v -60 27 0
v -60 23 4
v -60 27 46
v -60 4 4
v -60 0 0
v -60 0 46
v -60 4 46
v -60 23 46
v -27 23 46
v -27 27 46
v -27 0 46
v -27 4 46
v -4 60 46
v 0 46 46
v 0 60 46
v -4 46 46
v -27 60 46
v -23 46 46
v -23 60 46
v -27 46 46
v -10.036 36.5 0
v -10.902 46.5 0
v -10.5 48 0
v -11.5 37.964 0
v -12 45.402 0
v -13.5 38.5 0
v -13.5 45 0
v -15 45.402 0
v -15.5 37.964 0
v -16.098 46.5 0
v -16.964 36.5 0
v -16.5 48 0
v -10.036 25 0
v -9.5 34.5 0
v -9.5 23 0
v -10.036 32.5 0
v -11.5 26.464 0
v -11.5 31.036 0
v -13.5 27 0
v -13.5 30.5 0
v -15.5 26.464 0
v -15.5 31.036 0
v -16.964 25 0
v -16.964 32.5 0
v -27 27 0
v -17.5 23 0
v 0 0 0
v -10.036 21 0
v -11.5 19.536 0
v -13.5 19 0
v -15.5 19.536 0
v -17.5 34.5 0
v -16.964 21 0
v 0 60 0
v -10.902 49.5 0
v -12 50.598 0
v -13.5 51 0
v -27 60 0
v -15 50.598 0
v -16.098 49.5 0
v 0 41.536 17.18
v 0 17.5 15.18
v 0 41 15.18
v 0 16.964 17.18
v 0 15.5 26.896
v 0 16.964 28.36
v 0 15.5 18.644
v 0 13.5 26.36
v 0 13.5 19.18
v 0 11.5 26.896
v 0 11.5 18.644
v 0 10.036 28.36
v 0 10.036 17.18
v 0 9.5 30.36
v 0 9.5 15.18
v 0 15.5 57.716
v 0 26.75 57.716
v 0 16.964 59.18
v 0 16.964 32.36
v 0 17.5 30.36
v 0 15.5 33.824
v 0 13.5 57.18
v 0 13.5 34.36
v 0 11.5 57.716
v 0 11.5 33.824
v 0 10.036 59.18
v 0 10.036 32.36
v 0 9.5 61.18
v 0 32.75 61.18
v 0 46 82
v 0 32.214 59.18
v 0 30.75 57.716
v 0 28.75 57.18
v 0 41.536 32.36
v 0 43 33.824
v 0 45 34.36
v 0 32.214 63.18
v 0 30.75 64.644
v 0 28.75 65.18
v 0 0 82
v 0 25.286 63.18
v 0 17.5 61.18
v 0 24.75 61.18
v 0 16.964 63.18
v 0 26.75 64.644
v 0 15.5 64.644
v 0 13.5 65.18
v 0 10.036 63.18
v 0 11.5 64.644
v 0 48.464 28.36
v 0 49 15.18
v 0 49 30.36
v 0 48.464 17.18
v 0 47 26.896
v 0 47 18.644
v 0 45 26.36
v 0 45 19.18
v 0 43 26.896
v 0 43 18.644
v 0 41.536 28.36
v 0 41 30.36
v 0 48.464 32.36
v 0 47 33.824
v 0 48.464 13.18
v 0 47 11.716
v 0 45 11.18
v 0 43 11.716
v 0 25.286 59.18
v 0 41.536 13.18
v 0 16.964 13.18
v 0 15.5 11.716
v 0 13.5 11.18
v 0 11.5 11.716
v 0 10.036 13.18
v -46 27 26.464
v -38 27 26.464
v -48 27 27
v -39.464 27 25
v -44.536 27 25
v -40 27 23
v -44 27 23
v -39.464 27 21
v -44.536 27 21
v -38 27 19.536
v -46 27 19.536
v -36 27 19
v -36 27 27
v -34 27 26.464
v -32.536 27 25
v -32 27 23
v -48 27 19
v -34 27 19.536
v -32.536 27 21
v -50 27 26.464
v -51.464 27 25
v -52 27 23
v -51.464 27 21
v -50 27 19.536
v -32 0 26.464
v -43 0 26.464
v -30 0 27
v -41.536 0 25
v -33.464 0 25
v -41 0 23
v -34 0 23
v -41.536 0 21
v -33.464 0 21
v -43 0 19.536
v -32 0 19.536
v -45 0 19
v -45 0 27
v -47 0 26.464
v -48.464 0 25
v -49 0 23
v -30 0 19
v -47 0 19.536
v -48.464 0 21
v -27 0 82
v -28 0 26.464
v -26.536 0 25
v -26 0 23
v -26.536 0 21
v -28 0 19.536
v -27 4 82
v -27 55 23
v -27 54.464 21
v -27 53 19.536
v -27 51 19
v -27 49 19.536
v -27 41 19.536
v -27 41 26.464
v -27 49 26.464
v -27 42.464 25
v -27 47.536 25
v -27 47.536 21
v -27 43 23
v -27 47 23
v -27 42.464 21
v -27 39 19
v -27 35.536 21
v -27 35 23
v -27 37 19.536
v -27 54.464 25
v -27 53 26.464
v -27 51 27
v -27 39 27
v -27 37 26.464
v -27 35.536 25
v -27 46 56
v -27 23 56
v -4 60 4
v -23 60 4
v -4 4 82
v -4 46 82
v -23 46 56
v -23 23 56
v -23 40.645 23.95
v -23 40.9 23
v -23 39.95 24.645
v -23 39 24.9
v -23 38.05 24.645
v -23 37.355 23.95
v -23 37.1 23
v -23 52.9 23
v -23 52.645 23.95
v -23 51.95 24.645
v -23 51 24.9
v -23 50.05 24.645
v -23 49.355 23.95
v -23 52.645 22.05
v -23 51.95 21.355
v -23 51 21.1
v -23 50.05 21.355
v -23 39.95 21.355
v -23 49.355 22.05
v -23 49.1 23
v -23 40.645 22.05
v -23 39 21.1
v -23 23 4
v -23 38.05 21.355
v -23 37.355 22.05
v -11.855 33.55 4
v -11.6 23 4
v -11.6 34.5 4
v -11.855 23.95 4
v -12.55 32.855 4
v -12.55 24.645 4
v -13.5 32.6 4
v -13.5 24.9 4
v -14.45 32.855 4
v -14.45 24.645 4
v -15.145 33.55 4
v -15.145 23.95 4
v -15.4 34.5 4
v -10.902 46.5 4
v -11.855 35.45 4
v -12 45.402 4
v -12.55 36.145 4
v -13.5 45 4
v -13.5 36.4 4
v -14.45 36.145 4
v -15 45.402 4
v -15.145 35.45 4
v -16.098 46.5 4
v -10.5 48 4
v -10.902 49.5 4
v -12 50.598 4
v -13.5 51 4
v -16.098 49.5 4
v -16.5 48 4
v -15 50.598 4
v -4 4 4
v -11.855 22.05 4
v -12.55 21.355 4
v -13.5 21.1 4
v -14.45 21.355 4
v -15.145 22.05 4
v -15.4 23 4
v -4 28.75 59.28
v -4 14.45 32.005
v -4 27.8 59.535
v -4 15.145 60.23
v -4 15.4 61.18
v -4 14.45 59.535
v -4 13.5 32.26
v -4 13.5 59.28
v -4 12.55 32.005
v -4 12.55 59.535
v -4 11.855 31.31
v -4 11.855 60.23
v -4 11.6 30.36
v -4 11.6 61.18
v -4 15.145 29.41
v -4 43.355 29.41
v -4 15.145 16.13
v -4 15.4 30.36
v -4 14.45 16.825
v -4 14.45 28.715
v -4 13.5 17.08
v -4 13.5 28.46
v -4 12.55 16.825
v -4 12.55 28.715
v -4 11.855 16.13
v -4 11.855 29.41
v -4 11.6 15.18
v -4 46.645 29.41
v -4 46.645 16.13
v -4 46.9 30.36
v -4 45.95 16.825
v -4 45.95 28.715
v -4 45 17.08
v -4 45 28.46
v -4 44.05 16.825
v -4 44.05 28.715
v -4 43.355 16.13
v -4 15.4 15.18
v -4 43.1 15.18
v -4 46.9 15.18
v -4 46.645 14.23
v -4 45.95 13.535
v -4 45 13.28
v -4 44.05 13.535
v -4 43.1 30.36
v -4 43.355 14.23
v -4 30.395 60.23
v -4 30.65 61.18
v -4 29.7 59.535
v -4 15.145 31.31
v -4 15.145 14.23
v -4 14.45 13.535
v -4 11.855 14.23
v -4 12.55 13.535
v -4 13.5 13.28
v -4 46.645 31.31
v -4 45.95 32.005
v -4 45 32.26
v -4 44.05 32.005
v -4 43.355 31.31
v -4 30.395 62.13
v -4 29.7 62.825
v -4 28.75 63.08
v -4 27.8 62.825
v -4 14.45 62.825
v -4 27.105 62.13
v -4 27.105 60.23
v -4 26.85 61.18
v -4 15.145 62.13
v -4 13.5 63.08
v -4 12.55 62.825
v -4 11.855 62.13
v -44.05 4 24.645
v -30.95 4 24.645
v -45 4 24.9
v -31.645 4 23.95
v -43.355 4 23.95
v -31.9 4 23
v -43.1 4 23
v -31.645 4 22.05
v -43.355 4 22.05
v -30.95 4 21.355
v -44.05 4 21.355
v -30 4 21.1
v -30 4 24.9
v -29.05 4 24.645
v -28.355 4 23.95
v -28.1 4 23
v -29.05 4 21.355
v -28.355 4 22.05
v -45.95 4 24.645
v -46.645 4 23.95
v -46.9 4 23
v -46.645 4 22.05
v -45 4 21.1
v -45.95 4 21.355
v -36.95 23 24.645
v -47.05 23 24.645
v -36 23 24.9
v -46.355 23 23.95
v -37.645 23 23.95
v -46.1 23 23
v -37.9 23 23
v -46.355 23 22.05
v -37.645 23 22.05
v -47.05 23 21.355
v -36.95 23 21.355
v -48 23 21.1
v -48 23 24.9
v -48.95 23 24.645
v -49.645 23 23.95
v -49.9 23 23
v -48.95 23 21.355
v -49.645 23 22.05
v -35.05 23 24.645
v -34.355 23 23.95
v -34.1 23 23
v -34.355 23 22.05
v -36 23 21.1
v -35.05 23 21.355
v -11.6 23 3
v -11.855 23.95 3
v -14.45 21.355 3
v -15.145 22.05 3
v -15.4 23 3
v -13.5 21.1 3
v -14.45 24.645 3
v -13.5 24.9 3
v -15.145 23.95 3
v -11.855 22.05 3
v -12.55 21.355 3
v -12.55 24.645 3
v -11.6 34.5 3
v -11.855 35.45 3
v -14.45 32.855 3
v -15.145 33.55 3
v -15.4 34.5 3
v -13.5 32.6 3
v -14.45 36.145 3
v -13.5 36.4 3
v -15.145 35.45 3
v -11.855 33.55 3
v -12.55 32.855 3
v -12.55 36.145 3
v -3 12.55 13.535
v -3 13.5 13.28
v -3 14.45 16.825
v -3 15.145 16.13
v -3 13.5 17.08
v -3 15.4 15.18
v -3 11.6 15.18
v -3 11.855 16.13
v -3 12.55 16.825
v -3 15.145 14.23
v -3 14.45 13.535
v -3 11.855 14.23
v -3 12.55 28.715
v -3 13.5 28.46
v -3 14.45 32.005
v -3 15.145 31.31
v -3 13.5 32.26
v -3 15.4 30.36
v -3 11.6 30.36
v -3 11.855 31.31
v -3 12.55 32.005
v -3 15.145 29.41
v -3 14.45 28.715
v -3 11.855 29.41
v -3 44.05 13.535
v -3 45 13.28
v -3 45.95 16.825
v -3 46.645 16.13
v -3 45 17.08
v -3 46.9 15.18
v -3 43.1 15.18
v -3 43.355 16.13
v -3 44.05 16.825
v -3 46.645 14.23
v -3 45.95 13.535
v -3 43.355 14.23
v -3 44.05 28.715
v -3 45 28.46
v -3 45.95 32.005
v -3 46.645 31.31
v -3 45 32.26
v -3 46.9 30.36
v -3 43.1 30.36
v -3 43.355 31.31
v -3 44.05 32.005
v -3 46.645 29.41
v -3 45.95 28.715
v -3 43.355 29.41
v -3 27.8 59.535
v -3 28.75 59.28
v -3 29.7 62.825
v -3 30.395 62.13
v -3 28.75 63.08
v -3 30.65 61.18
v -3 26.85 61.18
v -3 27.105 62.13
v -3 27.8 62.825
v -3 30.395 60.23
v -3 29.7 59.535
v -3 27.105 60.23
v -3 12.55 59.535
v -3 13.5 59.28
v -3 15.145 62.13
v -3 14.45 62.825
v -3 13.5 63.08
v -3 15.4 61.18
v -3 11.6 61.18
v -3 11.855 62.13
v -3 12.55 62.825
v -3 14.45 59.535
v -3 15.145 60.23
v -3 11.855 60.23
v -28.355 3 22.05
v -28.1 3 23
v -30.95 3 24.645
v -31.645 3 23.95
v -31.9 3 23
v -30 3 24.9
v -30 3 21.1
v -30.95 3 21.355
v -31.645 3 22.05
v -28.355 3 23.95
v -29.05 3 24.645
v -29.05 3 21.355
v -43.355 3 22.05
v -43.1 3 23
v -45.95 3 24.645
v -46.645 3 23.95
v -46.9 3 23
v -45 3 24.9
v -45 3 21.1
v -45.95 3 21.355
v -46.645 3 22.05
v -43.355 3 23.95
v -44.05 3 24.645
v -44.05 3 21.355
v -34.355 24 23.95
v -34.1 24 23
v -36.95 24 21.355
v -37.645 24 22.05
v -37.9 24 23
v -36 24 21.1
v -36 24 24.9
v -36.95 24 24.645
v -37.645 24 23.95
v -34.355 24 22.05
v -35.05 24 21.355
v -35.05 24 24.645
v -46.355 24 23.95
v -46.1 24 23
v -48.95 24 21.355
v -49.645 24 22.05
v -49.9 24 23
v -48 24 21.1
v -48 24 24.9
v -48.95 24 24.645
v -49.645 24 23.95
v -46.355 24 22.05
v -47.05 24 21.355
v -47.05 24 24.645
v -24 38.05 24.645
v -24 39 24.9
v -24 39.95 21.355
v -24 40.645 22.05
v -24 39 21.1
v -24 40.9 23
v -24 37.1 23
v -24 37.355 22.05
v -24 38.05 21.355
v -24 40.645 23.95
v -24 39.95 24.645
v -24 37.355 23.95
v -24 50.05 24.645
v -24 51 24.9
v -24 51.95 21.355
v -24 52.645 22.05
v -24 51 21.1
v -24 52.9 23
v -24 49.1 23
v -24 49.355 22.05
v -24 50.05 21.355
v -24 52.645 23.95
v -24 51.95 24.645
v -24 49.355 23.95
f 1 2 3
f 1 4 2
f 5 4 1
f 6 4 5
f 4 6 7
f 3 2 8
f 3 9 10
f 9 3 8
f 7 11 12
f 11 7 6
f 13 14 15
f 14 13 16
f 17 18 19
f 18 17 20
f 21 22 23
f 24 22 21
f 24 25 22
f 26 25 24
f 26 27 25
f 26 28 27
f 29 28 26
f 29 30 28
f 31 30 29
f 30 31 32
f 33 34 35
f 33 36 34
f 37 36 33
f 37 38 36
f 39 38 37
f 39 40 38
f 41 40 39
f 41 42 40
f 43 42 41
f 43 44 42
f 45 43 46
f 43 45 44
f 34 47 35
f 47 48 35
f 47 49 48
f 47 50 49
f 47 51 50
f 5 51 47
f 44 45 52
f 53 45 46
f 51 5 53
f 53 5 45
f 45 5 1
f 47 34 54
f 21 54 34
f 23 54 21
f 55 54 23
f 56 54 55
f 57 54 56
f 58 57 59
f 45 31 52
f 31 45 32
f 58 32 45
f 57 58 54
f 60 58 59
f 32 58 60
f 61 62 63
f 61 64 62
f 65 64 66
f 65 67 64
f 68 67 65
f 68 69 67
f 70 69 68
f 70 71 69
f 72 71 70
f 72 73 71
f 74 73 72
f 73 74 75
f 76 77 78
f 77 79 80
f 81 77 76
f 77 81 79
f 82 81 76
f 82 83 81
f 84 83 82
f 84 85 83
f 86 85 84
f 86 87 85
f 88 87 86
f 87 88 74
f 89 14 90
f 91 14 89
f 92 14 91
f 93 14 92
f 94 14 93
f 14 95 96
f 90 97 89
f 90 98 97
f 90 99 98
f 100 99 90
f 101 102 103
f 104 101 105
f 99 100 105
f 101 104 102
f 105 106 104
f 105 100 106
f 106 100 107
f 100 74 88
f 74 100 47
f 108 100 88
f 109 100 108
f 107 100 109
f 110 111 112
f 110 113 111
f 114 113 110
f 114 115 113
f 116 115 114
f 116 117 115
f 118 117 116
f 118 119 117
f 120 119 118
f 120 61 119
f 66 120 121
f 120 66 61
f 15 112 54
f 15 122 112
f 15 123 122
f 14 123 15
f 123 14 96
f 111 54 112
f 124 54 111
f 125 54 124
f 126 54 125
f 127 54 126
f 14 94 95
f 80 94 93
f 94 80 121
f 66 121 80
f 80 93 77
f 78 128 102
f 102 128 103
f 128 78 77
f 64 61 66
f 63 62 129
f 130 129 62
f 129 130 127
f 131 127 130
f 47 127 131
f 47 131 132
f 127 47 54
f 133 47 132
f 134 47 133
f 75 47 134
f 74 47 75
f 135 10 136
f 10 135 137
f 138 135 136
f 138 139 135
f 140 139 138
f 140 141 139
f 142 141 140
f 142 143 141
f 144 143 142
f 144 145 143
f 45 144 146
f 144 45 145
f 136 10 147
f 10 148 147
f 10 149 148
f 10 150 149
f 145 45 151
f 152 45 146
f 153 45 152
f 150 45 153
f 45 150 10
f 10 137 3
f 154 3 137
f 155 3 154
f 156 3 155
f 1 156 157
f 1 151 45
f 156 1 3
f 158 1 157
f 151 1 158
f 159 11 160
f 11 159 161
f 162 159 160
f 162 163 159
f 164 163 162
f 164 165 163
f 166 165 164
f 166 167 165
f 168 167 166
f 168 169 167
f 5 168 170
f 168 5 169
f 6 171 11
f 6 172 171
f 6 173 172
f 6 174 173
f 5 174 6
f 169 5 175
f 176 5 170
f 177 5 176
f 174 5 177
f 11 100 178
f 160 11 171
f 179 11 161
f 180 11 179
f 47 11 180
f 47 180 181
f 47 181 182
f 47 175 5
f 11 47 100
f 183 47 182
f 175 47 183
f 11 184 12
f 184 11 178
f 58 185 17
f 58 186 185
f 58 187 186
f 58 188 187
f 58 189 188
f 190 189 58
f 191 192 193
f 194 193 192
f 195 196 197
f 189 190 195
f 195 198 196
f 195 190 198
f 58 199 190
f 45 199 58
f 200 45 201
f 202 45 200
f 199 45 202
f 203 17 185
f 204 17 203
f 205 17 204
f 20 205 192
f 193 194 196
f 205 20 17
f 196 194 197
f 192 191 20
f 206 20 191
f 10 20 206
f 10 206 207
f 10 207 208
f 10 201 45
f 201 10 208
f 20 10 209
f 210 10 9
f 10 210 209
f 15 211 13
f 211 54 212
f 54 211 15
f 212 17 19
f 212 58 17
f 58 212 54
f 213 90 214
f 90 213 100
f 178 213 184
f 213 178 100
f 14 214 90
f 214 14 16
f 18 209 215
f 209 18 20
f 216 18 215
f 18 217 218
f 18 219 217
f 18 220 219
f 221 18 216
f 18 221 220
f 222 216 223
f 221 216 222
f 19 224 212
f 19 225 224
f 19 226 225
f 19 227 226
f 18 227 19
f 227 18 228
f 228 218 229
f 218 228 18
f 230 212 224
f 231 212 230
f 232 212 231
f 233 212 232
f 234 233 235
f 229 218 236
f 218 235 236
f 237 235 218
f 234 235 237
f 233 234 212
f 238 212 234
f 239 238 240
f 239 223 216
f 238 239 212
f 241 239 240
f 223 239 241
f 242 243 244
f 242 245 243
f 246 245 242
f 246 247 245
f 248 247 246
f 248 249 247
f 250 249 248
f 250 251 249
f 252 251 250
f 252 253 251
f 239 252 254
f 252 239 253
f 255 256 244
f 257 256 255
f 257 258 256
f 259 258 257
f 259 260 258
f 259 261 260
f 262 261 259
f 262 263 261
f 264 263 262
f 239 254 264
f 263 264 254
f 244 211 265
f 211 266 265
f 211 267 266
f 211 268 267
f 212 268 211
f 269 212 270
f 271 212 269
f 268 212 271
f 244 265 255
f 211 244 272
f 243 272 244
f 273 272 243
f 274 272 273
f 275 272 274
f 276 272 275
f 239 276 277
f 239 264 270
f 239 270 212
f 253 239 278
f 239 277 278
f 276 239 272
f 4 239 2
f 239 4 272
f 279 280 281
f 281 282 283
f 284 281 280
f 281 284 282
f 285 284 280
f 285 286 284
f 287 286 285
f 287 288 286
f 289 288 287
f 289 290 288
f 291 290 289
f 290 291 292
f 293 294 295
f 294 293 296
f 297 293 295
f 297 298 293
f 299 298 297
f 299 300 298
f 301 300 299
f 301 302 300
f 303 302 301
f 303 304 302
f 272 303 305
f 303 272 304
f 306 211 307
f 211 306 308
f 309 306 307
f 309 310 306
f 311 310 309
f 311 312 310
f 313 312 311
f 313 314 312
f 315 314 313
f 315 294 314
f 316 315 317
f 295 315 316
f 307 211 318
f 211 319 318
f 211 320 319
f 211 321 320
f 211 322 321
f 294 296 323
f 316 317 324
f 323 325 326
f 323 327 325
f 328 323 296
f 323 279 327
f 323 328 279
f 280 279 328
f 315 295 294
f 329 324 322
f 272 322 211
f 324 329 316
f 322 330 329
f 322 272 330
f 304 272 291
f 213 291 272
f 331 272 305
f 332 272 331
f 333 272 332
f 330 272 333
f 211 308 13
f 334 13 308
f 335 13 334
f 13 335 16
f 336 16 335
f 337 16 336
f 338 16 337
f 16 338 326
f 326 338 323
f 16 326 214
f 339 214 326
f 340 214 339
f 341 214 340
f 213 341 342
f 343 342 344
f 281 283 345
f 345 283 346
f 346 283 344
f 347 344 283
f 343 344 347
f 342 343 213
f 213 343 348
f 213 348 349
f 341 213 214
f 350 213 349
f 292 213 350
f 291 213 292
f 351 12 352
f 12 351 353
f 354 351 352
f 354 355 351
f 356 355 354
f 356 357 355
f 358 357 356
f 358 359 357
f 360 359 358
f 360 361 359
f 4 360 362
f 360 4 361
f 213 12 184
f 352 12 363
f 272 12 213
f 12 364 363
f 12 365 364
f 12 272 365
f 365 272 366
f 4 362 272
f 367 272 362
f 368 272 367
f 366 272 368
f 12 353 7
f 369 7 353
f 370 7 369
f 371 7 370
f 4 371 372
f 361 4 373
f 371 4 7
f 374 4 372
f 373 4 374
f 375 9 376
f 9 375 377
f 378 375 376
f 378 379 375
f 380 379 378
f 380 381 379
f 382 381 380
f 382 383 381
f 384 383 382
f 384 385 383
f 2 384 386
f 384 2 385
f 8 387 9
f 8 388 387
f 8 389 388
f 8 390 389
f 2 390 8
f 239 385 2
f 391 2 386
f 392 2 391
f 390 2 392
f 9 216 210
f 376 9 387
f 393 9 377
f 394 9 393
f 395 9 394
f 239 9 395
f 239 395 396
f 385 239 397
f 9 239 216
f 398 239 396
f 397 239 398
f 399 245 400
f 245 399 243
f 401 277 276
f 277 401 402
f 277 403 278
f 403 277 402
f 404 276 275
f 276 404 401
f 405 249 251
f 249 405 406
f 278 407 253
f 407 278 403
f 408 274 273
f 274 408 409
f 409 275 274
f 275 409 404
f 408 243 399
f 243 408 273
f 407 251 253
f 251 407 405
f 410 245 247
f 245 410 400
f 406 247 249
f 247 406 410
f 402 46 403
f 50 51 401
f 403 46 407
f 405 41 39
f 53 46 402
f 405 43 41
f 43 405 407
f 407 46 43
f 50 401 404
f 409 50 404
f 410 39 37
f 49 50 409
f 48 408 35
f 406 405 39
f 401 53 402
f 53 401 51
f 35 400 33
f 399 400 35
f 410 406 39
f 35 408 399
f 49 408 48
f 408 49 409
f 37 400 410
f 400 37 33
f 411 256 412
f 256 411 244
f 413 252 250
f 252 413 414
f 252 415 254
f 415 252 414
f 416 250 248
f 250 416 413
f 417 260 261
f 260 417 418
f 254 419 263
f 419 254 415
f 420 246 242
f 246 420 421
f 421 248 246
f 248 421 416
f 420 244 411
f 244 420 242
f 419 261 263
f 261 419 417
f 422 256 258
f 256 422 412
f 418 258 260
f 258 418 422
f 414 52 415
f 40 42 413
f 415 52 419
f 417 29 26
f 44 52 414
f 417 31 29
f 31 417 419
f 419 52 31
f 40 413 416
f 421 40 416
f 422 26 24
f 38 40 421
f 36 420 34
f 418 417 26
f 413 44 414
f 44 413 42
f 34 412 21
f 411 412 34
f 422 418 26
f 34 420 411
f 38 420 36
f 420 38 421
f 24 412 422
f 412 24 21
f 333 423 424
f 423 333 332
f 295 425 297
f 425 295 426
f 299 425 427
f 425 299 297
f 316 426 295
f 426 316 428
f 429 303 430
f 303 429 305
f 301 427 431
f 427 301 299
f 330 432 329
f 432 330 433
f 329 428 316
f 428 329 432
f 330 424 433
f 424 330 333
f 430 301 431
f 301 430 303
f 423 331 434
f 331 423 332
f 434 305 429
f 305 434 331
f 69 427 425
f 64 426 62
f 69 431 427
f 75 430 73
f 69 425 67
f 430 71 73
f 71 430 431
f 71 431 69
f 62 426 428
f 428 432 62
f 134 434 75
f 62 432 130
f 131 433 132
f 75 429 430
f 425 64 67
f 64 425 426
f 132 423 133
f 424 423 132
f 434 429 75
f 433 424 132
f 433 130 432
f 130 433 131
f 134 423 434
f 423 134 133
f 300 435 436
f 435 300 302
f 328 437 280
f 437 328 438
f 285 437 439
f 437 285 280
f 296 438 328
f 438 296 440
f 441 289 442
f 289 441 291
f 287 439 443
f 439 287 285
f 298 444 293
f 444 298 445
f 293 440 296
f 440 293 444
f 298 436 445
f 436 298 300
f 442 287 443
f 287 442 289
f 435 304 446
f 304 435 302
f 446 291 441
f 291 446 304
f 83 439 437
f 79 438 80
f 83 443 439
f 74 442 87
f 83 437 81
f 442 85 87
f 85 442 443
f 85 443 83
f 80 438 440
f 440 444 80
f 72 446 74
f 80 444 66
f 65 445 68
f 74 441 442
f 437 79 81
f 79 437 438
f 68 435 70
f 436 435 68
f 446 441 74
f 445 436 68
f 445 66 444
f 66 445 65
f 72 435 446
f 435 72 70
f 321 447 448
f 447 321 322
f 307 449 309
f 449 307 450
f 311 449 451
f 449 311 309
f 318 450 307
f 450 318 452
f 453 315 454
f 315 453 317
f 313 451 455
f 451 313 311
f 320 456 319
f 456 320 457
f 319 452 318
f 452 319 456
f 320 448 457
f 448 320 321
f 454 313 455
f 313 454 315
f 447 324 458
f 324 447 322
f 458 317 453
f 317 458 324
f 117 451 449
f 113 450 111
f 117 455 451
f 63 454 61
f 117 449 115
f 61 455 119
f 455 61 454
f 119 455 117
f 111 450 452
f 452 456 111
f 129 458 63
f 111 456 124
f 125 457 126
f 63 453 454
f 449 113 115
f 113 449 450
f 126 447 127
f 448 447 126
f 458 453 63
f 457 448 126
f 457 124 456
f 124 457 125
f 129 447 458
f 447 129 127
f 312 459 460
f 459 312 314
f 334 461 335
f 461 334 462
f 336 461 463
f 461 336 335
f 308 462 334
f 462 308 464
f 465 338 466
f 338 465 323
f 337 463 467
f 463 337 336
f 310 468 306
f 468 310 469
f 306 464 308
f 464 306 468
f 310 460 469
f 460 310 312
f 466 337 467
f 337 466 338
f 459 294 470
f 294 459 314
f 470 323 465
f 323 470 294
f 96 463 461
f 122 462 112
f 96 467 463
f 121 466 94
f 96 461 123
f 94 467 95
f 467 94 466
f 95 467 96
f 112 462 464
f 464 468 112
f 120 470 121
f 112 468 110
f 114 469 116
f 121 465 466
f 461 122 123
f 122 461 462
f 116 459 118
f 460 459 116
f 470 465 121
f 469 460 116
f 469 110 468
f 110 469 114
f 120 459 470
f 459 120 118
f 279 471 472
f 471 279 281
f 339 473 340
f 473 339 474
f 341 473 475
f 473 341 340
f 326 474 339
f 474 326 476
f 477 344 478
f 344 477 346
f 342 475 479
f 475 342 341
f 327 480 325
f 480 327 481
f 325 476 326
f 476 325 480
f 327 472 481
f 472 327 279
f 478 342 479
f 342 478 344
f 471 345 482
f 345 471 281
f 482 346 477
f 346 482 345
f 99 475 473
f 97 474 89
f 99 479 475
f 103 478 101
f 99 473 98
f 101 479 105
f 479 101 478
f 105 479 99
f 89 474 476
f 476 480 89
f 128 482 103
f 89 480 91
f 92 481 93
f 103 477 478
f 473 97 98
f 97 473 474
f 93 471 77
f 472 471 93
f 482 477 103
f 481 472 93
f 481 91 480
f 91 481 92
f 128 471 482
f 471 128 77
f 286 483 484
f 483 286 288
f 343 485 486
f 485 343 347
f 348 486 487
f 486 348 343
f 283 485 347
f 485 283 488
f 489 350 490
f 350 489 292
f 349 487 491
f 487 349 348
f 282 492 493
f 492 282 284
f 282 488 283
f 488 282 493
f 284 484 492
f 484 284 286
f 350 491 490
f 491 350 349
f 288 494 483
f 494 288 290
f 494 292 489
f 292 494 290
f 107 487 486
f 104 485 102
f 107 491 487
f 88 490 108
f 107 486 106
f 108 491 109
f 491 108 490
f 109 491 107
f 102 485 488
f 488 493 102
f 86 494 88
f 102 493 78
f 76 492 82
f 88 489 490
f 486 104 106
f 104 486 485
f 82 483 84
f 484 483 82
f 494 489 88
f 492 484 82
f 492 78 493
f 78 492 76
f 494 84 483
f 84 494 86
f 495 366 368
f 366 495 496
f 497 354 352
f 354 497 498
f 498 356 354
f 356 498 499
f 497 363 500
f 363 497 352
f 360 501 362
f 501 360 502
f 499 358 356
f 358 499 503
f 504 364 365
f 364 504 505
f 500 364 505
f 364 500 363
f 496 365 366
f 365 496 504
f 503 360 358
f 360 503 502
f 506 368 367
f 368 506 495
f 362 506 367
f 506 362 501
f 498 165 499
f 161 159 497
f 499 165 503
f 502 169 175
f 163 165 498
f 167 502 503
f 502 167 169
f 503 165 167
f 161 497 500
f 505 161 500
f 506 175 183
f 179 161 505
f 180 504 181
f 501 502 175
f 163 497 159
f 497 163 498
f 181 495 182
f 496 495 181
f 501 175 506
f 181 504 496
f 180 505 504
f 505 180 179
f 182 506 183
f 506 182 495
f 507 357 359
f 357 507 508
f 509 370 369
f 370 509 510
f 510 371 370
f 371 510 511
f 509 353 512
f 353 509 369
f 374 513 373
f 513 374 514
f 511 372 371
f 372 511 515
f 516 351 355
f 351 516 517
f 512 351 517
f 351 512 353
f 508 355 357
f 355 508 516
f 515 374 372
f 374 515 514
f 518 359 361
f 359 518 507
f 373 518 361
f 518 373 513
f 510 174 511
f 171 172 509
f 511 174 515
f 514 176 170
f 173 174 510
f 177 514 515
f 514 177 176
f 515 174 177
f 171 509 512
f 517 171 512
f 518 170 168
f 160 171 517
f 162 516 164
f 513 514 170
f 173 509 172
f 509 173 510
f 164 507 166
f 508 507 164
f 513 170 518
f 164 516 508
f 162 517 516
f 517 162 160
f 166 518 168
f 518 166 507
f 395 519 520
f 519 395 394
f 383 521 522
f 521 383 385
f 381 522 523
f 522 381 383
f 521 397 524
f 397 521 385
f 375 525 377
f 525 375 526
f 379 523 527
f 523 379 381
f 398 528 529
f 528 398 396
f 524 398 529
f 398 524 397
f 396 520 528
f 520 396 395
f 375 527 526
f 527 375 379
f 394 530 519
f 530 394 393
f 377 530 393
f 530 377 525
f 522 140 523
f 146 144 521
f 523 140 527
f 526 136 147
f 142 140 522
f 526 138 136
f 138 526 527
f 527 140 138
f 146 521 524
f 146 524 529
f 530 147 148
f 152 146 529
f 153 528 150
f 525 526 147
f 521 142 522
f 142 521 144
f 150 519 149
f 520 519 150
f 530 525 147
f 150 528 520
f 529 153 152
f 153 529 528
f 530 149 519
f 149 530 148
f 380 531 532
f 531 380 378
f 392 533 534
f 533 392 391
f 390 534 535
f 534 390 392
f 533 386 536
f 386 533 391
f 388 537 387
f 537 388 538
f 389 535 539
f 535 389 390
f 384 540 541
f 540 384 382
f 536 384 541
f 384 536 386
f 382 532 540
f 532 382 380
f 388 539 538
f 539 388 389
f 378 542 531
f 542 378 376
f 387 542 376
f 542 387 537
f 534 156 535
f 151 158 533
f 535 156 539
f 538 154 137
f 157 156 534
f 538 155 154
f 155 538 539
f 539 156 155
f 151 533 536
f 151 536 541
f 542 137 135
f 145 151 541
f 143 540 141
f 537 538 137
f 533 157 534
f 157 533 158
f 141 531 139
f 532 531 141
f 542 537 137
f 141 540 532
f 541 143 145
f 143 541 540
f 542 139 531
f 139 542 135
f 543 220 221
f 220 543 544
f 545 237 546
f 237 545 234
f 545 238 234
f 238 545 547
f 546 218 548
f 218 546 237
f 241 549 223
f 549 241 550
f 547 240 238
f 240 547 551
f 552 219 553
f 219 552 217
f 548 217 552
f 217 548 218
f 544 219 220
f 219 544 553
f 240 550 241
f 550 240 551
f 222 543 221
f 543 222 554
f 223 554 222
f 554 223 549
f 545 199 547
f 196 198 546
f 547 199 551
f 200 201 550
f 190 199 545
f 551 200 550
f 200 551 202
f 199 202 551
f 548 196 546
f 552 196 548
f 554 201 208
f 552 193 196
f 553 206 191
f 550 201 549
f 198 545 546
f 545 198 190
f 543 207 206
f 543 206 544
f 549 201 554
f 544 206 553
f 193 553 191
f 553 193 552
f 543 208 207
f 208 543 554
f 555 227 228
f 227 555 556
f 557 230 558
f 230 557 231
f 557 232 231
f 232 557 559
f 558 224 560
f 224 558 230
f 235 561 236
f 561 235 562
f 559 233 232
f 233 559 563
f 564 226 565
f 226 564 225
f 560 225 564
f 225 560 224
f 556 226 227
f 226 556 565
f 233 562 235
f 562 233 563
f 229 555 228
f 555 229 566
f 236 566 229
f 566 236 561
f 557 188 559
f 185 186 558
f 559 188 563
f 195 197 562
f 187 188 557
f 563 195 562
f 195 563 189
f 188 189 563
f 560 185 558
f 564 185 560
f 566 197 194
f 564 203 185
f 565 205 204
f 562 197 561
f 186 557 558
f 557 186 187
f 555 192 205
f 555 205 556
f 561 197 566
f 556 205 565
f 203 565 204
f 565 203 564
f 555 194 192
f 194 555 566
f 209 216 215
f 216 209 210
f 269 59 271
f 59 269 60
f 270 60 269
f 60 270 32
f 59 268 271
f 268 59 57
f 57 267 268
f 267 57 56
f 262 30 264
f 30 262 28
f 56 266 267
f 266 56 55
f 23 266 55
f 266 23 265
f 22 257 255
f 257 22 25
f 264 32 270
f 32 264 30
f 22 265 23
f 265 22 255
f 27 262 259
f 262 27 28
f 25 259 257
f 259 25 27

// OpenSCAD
difference(){
	scale(v = [-1, 1, 1]) {
		union() {
			cube(size = [60, 27, 46]);
			cube(size = [27, 60, 46]);
			translate(v = [0, 0, 42]) {
				cube(size = [27, 46, 40]);
			}
			translate(v = [13.5000000000, 23.0000000000, 0]) {
				rotate(a = 180, v = [1, 0, 0]) {
				}
			}
			translate(v = [13.5000000000, 34.5000000000, 0]) {
				rotate(a = 180, v = [1, 0, 0]) {
				}
			}
			translate(v = [0, 13.5000000000, 15.1800000000]) {
				rotate(a = -90, v = [0, 1, 0]) {
				}
			}
			translate(v = [0, 13.5000000000, 30.3600000000]) {
				rotate(a = -90, v = [0, 1, 0]) {
				}
			}
			translate(v = [0, 45.0000000000, 15.1800000000]) {
				rotate(a = -90, v = [0, 1, 0]) {
				}
			}
			translate(v = [0, 45.0000000000, 30.3600000000]) {
				rotate(a = -90, v = [0, 1, 0]) {
				}
			}
			translate(v = [0, 28.7500000000, 61.1800000000]) {
				rotate(a = -90, v = [0, 1, 0]) {
				}
			}
			translate(v = [0, 13.5000000000, 61.1800000000]) {
				rotate(a = -90, v = [0, 1, 0]) {
				}
			}
			translate(v = [30.0000000000, 0, 23.0000000000]) {
				rotate(a = 90, v = [1, 0, 0]) {
				}
			}
			translate(v = [45.0000000000, 0, 23.0000000000]) {
				rotate(a = 90, v = [1, 0, 0]) {
				}
			}
			translate(v = [36.0000000000, 27, 23.0000000000]) {
				rotate(a = -90, v = [1, 0, 0]) {
				}
			}
			translate(v = [48.0000000000, 27, 23.0000000000]) {
				rotate(a = -90, v = [1, 0, 0]) {
				}
			}
			translate(v = [27, 39.0000000000, 23.0000000000]) {
				rotate(a = 90, v = [0, 1, 0]) {
				}
			}
			translate(v = [27, 51.0000000000, 23.0000000000]) {
				rotate(a = 90, v = [0, 1, 0]) {
				}
			}
			translate(v = [13.5000000000, 48.0000000000, -1]) {
			}
		}
	}
	/* Holes Below*/
	scale(v = [-1, 1, 1]){
		union(){
			translate(v = [4, 4, 4]) {
				cube(size = [19, 60, 100]);
				cube(size = [60, 19, 100]);
			}
			translate(v = [4, 4, 56]) {
				cube(size = [50, 50, 50]);
			}
			translate(v = [13.5000000000, 23.0000000000, 0]){
				rotate(a = 180, v = [1, 0, 0]){
					union() {
						union() {
							translate(v = [0, 0, -5]) {
								cylinder($fn = 12, h = 5, r = 1.9000000000);
							}
							translate(v = [0, 0, -3]) {
								cylinder($fn = 12, h = 3, r1 = 1.9000000000, r2 = 4);
							}
						}
						cylinder($fn = 12, h = 1, r = 4);
					}
				}
			}
			translate(v = [13.5000000000, 34.5000000000, 0]){
				rotate(a = 180, v = [1, 0, 0]){
					union() {
						union() {
							translate(v = [0, 0, -5]) {
								cylinder($fn = 12, h = 5, r = 1.9000000000);
							}
							translate(v = [0, 0, -3]) {
								cylinder($fn = 12, h = 3, r1 = 1.9000000000, r2 = 4);
							}
						}
						cylinder($fn = 12, h = 1, r = 4);
					}
				}
			}
			translate(v = [0, 13.5000000000, 15.1800000000]){
				rotate(a = -90, v = [0, 1, 0]){
					union() {
						union() {
							translate(v = [0, 0, -5]) {
								cylinder($fn = 12, h = 5, r = 1.9000000000);
							}
							translate(v = [0, 0, -3]) {
								cylinder($fn = 12, h = 3, r1 = 1.9000000000, r2 = 4);
							}
						}
						cylinder($fn = 12, h = 1, r = 4);
					}
				}
			}
			translate(v = [0, 13.5000000000, 30.3600000000]){
				rotate(a = -90, v = [0, 1, 0]){
					union() {
						union() {
							translate(v = [0, 0, -5]) {
								cylinder($fn = 12, h = 5, r = 1.9000000000);
							}
							translate(v = [0, 0, -3]) {
								cylinder($fn = 12, h = 3, r1 = 1.9000000000, r2 = 4);
							}
						}
						cylinder($fn = 12, h = 1, r = 4);
					}
				}
			}
			translate(v = [0, 45.0000000000, 15.1800000000]){
				rotate(a = -90, v = [0, 1, 0]){
					union() {
						union() {
							translate(v = [0, 0, -5]) {
								cylinder($fn = 12, h = 5, r = 1.9000000000);
							}
							translate(v = [0, 0, -3]) {
								cylinder($fn = 12, h = 3, r1 = 1.9000000000, r2 = 4);
							}
						}
						cylinder($fn = 12, h = 1, r = 4);
					}
				}
			}
			translate(v = [0, 45.0000000000, 30.3600000000]){
				rotate(a = -90, v = [0, 1, 0]){
					union() {
						union() {
							translate(v = [0, 0, -5]) {
								cylinder($fn = 12, h = 5, r = 1.9000000000);
							}
							translate(v = [0, 0, -3]) {
								cylinder($fn = 12, h = 3, r1 = 1.9000000000, r2 = 4);
							}
						}
						cylinder($fn = 12, h = 1, r = 4);
					}
				}
			}
			translate(v = [0, 28.7500000000, 61.1800000000]){
				rotate(a = -90, v = [0, 1, 0]){
					union() {
						union() {
							translate(v = [0, 0, -5]) {
								cylinder($fn = 12, h = 5, r = 1.9000000000);
							}
							translate(v = [0, 0, -3]) {
								cylinder($fn = 12, h = 3, r1 = 1.9000000000, r2 = 4);
							}
						}
						cylinder($fn = 12, h = 1, r = 4);
					}
				}
			}
			translate(v = [0, 13.5000000000, 61.1800000000]){
				rotate(a = -90, v = [0, 1, 0]){
					union() {
						union() {
							translate(v = [0, 0, -5]) {
								cylinder($fn = 12, h = 5, r = 1.9000000000);
							}
							translate(v = [0, 0, -3]) {
								cylinder($fn = 12, h = 3, r1 = 1.9000000000, r2 = 4);
							}
						}
						cylinder($fn = 12, h = 1, r = 4);
					}
				}
			}
			translate(v = [30.0000000000, 0, 23.0000000000]){
				rotate(a = 90, v = [1, 0, 0]){
					union() {
						union() {
							translate(v = [0, 0, -5]) {
								cylinder($fn = 12, h = 5, r = 1.9000000000);
							}
							translate(v = [0, 0, -3]) {
								cylinder($fn = 12, h = 3, r1 = 1.9000000000, r2 = 4);
							}
						}
						cylinder($fn = 12, h = 1, r = 4);
					}
				}
			}
			translate(v = [45.0000000000, 0, 23.0000000000]){
				rotate(a = 90, v = [1, 0, 0]){
					union() {
						union() {
							translate(v = [0, 0, -5]) {
								cylinder($fn = 12, h = 5, r = 1.9000000000);
							}
							translate(v = [0, 0, -3]) {
								cylinder($fn = 12, h = 3, r1 = 1.9000000000, r2 = 4);
							}
						}
						cylinder($fn = 12, h = 1, r = 4);
					}
				}
			}
			translate(v = [36.0000000000, 27, 23.0000000000]){
				rotate(a = -90, v = [1, 0, 0]){
					union() {
						union() {
							translate(v = [0, 0, -5]) {
								cylinder($fn = 12, h = 5, r = 1.9000000000);
							}
							translate(v = [0, 0, -3]) {
								cylinder($fn = 12, h = 3, r1 = 1.9000000000, r2 = 4);
							}
						}
						cylinder($fn = 12, h = 1, r = 4);
					}
				}
			}
			translate(v = [48.0000000000, 27, 23.0000000000]){
				rotate(a = -90, v = [1, 0, 0]){
					union() {
						union() {
							translate(v = [0, 0, -5]) {
								cylinder($fn = 12, h = 5, r = 1.9000000000);
							}
							translate(v = [0, 0, -3]) {
								cylinder($fn = 12, h = 3, r1 = 1.9000000000, r2 = 4);
							}
						}
						cylinder($fn = 12, h = 1, r = 4);
					}
				}
			}
			translate(v = [27, 39.0000000000, 23.0000000000]){
				rotate(a = 90, v = [0, 1, 0]){
					union() {
						union() {
							translate(v = [0, 0, -5]) {
								cylinder($fn = 12, h = 5, r = 1.9000000000);
							}
							translate(v = [0, 0, -3]) {
								cylinder($fn = 12, h = 3, r1 = 1.9000000000, r2 = 4);
							}
						}
						cylinder($fn = 12, h = 1, r = 4);
					}
				}
			}
			translate(v = [27, 51.0000000000, 23.0000000000]){
				rotate(a = 90, v = [0, 1, 0]){
					union() {
						union() {
							translate(v = [0, 0, -5]) {
								cylinder($fn = 12, h = 5, r = 1.9000000000);
							}
							translate(v = [0, 0, -3]) {
								cylinder($fn = 12, h = 3, r1 = 1.9000000000, r2 = 4);
							}
						}
						cylinder($fn = 12, h = 1, r = 4);
					}
				}
			}
			translate(v = [13.5000000000, 48.0000000000, -1]){
				cylinder($fn = 12, h = 6, r = 3);
			}
		}
	} /* End Holes */ 
}
